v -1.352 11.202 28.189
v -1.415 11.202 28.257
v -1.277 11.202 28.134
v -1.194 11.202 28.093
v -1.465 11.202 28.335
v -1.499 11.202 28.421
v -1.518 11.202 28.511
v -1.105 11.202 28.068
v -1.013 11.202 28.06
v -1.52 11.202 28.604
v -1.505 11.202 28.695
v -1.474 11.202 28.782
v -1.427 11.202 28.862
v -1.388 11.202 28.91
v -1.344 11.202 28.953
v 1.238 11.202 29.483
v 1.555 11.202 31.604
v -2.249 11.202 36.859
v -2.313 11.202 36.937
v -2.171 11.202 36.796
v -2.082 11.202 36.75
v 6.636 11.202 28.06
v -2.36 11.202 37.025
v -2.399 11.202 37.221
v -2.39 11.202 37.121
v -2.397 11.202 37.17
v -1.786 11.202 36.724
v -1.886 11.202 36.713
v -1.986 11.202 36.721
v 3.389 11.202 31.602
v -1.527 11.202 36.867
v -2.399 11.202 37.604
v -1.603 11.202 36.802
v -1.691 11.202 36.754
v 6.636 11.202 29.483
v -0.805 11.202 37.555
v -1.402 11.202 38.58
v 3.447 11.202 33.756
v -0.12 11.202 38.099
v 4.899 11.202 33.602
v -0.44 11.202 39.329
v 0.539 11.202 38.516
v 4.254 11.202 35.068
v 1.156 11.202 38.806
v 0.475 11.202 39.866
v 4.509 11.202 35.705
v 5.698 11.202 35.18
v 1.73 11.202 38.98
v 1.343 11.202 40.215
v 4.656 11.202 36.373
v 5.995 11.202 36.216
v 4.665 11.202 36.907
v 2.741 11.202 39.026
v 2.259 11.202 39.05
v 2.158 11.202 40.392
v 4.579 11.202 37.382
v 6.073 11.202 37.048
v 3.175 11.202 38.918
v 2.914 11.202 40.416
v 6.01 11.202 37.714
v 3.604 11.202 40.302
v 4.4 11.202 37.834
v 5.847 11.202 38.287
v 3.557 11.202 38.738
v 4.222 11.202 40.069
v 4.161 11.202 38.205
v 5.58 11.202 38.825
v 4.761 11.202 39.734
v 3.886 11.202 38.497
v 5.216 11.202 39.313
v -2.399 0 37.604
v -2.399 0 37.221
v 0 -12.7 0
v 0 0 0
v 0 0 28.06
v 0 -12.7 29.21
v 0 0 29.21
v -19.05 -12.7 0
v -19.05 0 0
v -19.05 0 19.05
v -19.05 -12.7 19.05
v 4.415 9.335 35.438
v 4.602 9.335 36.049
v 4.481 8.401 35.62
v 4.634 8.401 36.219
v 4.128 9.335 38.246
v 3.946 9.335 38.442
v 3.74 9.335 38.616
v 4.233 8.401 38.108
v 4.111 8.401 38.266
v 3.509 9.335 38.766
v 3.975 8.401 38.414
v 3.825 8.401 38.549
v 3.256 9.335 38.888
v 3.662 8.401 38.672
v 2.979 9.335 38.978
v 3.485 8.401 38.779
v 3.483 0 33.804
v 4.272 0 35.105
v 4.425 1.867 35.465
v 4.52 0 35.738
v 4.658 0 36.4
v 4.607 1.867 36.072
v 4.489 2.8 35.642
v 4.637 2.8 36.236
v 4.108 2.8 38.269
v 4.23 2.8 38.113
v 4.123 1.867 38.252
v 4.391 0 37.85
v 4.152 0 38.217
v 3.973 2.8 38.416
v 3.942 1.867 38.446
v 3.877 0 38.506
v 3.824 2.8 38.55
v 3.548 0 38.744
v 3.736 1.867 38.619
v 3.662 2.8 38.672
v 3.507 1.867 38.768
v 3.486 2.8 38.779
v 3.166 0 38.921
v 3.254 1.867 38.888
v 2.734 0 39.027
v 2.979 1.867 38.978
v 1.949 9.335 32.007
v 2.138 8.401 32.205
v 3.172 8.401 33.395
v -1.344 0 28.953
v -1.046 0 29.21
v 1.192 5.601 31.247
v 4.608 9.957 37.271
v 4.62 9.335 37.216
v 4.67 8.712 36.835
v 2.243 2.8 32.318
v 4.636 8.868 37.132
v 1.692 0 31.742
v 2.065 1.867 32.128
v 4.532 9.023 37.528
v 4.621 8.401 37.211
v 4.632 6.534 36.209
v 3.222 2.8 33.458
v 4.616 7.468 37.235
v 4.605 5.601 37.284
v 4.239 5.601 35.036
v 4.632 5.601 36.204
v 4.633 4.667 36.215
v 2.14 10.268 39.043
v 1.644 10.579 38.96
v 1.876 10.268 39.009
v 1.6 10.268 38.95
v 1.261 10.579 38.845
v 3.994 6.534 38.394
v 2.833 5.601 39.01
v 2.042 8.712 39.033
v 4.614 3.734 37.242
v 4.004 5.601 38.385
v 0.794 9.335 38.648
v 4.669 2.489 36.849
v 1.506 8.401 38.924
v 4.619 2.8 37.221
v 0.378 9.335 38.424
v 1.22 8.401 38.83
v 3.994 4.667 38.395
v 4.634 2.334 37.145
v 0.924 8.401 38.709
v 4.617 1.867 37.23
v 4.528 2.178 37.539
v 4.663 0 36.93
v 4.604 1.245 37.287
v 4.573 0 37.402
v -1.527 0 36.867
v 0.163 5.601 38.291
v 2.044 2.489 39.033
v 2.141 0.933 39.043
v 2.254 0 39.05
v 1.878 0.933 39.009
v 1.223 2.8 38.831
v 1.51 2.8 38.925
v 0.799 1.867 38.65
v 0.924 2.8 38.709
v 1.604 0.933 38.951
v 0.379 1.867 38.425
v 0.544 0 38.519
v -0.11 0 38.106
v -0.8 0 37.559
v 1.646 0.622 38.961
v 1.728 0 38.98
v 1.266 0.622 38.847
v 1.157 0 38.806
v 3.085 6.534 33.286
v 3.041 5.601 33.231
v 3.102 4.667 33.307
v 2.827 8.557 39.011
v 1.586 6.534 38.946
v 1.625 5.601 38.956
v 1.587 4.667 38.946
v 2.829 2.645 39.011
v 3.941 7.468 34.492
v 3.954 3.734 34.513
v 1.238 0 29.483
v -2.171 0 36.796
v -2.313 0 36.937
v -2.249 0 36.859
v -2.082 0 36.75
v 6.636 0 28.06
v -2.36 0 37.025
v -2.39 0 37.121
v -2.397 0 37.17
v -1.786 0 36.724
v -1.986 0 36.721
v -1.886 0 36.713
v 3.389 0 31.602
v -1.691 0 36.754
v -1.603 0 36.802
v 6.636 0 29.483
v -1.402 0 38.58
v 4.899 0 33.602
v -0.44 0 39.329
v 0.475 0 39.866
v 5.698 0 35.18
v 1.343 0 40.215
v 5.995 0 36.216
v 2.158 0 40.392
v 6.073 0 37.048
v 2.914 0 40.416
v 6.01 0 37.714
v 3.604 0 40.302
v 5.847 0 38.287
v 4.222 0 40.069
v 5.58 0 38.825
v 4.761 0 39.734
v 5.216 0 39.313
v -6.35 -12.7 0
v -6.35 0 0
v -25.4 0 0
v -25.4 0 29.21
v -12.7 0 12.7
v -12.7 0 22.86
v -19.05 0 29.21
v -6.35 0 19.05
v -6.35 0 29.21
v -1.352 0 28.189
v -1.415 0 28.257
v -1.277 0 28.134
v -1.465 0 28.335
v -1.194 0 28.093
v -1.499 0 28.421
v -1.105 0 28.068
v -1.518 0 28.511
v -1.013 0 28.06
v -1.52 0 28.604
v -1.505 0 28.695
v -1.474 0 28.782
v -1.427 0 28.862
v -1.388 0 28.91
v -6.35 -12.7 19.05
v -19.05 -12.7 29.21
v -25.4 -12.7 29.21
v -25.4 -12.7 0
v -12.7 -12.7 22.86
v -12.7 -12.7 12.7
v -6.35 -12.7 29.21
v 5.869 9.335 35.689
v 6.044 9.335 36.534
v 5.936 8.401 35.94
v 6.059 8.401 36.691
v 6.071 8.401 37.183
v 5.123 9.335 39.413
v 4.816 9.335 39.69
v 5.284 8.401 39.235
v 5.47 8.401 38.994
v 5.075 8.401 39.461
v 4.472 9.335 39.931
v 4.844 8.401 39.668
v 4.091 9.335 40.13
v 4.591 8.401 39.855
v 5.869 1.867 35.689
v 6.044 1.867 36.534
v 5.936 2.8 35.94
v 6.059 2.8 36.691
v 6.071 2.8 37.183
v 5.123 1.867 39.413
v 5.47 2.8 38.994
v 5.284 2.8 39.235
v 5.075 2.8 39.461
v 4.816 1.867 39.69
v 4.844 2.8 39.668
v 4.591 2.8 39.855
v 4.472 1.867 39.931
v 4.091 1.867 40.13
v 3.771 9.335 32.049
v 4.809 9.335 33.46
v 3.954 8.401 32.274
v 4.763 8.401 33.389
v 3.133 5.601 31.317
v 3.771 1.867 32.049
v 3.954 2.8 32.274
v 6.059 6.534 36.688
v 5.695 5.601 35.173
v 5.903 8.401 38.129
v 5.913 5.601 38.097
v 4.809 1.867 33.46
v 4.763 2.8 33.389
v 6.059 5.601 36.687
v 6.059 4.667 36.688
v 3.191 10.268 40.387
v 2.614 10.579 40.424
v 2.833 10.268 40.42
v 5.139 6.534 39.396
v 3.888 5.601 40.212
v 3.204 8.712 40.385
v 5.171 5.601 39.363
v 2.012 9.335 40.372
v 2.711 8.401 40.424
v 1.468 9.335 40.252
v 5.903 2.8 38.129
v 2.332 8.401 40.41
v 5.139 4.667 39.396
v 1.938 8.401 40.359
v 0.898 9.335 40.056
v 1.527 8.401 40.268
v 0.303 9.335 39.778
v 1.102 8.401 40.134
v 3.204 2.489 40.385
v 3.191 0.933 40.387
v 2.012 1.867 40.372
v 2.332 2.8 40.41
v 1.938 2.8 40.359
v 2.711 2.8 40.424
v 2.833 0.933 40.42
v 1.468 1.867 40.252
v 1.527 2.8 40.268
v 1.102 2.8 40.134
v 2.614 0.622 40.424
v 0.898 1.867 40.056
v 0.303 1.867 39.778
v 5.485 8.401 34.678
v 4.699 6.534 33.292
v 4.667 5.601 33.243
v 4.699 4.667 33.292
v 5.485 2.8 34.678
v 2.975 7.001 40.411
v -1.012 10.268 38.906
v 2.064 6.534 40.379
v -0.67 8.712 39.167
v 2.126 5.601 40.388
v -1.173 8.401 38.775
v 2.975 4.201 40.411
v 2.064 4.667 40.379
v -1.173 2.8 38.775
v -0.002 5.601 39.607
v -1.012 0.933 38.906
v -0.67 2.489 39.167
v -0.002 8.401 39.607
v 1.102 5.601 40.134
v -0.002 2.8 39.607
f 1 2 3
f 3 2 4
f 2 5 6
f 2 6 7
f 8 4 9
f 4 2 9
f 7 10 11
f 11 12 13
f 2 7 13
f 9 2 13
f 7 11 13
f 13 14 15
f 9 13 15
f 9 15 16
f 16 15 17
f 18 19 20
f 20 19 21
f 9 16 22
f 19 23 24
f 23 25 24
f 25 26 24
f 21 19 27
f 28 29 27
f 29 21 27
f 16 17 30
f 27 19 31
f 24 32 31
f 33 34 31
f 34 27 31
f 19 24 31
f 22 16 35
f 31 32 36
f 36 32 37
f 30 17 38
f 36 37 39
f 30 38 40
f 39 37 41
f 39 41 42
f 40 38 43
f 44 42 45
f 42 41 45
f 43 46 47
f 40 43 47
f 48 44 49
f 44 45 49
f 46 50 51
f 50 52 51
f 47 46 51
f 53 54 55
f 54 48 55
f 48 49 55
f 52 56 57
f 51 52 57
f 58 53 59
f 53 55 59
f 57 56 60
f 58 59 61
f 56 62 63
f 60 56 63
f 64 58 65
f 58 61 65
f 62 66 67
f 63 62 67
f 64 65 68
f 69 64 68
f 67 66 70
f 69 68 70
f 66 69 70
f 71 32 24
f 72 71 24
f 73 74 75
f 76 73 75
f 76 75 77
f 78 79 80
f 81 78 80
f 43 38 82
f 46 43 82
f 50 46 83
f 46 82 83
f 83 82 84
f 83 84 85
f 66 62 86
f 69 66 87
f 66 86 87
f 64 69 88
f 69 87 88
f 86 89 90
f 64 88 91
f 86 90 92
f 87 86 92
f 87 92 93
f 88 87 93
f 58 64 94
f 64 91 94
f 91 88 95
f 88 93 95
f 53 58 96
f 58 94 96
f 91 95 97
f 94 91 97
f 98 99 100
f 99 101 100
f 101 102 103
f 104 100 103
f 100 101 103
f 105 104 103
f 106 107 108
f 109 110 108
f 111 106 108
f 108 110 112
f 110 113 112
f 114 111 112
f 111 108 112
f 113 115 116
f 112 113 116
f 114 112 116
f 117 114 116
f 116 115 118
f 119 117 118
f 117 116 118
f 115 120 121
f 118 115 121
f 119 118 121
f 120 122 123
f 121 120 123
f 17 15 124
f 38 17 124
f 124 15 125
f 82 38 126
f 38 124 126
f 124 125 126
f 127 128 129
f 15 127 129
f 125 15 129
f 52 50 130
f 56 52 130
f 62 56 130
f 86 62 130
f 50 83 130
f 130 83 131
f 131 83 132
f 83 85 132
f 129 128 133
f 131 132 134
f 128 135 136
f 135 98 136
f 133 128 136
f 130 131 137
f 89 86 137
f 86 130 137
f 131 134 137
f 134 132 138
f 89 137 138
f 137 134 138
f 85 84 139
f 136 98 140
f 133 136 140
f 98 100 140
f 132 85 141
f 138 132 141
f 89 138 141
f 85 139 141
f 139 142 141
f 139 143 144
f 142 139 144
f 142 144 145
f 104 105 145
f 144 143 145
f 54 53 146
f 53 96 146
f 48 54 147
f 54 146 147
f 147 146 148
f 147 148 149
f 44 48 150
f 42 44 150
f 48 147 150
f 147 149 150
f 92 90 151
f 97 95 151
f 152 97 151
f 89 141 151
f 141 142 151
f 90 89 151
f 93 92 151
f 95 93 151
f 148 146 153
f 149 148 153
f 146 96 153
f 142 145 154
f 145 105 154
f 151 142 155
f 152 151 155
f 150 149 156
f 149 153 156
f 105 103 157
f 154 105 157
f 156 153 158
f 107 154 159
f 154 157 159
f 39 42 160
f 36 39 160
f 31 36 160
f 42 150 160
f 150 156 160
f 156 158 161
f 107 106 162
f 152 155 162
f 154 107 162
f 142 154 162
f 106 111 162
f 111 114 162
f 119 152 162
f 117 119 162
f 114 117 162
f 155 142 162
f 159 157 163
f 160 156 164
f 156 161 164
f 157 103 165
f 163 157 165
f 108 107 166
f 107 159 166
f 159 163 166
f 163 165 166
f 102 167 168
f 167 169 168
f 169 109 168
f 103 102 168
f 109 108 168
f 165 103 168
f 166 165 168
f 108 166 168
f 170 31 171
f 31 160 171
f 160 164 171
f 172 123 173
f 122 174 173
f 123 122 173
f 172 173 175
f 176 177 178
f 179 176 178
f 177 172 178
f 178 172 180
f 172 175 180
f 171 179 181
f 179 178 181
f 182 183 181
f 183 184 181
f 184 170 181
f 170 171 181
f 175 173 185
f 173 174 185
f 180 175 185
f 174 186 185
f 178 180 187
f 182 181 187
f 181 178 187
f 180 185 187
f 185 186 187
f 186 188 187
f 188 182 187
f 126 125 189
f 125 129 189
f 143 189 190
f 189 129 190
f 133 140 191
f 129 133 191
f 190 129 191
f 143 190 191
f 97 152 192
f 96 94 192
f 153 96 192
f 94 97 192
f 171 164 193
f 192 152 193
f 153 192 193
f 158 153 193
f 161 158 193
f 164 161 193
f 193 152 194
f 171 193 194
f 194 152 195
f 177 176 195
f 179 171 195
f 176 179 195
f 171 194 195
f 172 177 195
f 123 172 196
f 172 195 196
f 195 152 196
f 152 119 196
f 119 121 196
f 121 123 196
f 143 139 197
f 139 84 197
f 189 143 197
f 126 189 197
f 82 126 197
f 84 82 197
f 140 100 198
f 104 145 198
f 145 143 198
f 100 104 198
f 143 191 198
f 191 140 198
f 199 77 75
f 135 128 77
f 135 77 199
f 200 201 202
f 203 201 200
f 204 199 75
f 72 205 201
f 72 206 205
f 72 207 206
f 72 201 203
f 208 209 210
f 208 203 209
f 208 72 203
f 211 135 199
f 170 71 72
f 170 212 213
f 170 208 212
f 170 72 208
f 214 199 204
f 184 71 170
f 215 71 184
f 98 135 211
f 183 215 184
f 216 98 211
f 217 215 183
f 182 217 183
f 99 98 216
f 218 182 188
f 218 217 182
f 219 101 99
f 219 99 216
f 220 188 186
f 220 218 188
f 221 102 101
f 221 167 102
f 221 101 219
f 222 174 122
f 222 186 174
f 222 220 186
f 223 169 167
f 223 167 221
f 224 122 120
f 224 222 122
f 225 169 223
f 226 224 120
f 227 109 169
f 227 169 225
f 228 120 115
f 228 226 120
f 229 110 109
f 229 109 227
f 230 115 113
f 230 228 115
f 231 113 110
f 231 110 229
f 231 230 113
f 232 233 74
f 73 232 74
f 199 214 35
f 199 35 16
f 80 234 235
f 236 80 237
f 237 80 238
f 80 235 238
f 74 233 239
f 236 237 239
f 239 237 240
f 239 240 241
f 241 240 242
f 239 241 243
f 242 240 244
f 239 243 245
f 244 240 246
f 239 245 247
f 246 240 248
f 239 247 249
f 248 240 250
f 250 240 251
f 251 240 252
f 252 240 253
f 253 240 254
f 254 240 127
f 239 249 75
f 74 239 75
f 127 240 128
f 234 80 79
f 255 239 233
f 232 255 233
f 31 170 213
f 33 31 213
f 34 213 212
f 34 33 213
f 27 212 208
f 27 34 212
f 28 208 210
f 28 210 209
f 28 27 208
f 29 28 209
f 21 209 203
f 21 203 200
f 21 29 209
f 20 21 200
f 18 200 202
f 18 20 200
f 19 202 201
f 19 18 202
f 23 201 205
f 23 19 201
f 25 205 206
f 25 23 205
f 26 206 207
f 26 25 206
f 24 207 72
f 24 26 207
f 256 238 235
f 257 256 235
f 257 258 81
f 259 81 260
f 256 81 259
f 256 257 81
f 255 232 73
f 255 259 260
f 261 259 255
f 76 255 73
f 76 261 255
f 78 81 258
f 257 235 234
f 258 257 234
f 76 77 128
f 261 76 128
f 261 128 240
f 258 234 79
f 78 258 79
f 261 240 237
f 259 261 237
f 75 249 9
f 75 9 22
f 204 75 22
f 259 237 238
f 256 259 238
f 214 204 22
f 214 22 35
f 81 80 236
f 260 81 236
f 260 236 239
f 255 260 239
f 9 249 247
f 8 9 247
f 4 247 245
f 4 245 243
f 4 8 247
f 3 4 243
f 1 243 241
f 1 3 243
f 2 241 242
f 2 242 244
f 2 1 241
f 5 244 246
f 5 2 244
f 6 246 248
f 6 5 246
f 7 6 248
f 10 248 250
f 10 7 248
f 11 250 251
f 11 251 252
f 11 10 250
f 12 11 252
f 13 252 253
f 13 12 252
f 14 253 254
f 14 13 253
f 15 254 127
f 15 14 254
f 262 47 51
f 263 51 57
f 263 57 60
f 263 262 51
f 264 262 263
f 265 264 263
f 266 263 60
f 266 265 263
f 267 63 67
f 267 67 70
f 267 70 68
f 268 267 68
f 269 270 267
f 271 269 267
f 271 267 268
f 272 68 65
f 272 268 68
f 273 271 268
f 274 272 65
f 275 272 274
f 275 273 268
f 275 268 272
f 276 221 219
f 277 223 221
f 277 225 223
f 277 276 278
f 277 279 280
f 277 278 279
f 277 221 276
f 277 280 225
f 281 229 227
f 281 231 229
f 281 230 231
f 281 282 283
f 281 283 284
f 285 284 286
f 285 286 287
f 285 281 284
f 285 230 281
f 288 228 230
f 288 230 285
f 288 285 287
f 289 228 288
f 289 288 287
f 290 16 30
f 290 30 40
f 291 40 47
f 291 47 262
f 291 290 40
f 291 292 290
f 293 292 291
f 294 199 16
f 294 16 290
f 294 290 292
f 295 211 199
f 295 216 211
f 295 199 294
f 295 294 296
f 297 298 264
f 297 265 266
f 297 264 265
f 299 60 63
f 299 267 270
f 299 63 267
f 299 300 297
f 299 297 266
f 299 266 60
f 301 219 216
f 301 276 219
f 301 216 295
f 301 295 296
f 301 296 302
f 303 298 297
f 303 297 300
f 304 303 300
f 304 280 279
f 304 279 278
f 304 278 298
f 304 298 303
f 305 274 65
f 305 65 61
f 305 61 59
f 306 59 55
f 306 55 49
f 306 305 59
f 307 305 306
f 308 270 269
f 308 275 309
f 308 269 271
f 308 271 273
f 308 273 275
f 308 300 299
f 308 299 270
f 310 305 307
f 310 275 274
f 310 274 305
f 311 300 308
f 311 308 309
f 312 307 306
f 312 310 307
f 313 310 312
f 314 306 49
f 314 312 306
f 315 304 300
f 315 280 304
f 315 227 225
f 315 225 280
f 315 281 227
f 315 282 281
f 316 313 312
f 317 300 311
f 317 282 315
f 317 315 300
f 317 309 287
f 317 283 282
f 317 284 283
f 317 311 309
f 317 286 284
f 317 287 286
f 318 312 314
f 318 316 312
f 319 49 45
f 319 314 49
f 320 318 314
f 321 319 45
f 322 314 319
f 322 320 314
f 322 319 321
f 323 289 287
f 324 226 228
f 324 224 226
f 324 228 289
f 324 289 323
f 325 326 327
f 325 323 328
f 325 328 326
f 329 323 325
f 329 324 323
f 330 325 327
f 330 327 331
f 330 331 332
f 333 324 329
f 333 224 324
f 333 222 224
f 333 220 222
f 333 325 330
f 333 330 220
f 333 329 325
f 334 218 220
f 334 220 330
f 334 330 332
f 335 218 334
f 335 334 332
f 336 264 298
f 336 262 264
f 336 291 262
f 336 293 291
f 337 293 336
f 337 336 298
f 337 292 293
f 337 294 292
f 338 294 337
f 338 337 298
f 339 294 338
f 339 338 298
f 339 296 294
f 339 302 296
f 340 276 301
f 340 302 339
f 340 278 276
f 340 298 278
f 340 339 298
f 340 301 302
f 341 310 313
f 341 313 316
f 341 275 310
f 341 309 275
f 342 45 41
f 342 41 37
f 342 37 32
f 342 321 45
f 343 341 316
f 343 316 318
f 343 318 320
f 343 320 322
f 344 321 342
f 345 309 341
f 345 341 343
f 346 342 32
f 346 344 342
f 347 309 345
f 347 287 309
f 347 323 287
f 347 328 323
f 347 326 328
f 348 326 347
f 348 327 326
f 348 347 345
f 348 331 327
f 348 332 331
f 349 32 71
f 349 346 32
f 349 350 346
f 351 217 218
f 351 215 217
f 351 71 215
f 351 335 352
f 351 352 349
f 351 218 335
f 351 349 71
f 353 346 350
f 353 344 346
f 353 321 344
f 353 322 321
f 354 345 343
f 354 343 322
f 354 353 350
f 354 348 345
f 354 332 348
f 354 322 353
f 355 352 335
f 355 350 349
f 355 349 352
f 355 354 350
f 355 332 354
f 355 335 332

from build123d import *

# Parameters (mm, degrees)
F1_DEPTH = 12.7
F3_DEPTH = 11.20158
F4_R     = 0.508


with BuildPart() as f1:
    # F0 (on Front) → F1 (new body)
    with BuildSketch(Plane.XZ):
        Polygon((-25.4, 29.21), (-25.4, 0), (-19.05, 0), (-19.05, 19.05), (-12.7, 12.7), (-6.35, 19.05), (-6.35, 0), (0, 0), (0, 29.21), (-6.35, 29.21), (-12.7, 22.86), (-19.05, 29.21), align=None)
    extrude(amount=F1_DEPTH)

    # F2 (on Front) → F3 (join)
    with BuildSketch(Plane.XZ):
        with BuildLine():
            Line((-2.3994161721, 28.0597675592), (6.6355378367, 28.0597675592))
            Line((6.6355378367, 28.0597675592), (6.6355378367, 29.4827252309))
            Line((6.6355378367, 29.4827252309), (1.2384620469, 29.4827252309))
            add(Edge.make_bspline(
                [(1.2384620469, 29.4827252309), (4.3676832704, 32.1977850174), (8.890126837, 38.6554285203), (1.7391745932, 42.078929022), (-2.3994161721, 37.6041723206)],
                knots=[0, 0, 0, 0, 0.5203529604, 1, 1, 1, 1], degree=3))
            Line((-2.3994161721, 37.6041723206), (-2.3994161721, 35.8844103642))
            add(Edge.make_bspline(
                [(-2.3994161721, 28.0597675592), (2.1288901598, 31.8470776853), (7.5727786172, 37.3091404259), (1.4697099185, 40.5985963112), (-2.3994161721, 35.8844103642)],
                knots=[0, 0, 0, 0, 0.5601329519, 1, 1, 1, 1], degree=3))
        make_face()
    extrude(amount=-F3_DEPTH)

    # F4
    f4_edges = [f1.edges().sort_by_distance(p)[0] for p in [
        (-2.399416, 5.60079, 28.059768),
        (-2.399416, 5.60079, 35.88441),
    ]]
    fillet(f4_edges, radius=F4_R)


solid = f1.part
